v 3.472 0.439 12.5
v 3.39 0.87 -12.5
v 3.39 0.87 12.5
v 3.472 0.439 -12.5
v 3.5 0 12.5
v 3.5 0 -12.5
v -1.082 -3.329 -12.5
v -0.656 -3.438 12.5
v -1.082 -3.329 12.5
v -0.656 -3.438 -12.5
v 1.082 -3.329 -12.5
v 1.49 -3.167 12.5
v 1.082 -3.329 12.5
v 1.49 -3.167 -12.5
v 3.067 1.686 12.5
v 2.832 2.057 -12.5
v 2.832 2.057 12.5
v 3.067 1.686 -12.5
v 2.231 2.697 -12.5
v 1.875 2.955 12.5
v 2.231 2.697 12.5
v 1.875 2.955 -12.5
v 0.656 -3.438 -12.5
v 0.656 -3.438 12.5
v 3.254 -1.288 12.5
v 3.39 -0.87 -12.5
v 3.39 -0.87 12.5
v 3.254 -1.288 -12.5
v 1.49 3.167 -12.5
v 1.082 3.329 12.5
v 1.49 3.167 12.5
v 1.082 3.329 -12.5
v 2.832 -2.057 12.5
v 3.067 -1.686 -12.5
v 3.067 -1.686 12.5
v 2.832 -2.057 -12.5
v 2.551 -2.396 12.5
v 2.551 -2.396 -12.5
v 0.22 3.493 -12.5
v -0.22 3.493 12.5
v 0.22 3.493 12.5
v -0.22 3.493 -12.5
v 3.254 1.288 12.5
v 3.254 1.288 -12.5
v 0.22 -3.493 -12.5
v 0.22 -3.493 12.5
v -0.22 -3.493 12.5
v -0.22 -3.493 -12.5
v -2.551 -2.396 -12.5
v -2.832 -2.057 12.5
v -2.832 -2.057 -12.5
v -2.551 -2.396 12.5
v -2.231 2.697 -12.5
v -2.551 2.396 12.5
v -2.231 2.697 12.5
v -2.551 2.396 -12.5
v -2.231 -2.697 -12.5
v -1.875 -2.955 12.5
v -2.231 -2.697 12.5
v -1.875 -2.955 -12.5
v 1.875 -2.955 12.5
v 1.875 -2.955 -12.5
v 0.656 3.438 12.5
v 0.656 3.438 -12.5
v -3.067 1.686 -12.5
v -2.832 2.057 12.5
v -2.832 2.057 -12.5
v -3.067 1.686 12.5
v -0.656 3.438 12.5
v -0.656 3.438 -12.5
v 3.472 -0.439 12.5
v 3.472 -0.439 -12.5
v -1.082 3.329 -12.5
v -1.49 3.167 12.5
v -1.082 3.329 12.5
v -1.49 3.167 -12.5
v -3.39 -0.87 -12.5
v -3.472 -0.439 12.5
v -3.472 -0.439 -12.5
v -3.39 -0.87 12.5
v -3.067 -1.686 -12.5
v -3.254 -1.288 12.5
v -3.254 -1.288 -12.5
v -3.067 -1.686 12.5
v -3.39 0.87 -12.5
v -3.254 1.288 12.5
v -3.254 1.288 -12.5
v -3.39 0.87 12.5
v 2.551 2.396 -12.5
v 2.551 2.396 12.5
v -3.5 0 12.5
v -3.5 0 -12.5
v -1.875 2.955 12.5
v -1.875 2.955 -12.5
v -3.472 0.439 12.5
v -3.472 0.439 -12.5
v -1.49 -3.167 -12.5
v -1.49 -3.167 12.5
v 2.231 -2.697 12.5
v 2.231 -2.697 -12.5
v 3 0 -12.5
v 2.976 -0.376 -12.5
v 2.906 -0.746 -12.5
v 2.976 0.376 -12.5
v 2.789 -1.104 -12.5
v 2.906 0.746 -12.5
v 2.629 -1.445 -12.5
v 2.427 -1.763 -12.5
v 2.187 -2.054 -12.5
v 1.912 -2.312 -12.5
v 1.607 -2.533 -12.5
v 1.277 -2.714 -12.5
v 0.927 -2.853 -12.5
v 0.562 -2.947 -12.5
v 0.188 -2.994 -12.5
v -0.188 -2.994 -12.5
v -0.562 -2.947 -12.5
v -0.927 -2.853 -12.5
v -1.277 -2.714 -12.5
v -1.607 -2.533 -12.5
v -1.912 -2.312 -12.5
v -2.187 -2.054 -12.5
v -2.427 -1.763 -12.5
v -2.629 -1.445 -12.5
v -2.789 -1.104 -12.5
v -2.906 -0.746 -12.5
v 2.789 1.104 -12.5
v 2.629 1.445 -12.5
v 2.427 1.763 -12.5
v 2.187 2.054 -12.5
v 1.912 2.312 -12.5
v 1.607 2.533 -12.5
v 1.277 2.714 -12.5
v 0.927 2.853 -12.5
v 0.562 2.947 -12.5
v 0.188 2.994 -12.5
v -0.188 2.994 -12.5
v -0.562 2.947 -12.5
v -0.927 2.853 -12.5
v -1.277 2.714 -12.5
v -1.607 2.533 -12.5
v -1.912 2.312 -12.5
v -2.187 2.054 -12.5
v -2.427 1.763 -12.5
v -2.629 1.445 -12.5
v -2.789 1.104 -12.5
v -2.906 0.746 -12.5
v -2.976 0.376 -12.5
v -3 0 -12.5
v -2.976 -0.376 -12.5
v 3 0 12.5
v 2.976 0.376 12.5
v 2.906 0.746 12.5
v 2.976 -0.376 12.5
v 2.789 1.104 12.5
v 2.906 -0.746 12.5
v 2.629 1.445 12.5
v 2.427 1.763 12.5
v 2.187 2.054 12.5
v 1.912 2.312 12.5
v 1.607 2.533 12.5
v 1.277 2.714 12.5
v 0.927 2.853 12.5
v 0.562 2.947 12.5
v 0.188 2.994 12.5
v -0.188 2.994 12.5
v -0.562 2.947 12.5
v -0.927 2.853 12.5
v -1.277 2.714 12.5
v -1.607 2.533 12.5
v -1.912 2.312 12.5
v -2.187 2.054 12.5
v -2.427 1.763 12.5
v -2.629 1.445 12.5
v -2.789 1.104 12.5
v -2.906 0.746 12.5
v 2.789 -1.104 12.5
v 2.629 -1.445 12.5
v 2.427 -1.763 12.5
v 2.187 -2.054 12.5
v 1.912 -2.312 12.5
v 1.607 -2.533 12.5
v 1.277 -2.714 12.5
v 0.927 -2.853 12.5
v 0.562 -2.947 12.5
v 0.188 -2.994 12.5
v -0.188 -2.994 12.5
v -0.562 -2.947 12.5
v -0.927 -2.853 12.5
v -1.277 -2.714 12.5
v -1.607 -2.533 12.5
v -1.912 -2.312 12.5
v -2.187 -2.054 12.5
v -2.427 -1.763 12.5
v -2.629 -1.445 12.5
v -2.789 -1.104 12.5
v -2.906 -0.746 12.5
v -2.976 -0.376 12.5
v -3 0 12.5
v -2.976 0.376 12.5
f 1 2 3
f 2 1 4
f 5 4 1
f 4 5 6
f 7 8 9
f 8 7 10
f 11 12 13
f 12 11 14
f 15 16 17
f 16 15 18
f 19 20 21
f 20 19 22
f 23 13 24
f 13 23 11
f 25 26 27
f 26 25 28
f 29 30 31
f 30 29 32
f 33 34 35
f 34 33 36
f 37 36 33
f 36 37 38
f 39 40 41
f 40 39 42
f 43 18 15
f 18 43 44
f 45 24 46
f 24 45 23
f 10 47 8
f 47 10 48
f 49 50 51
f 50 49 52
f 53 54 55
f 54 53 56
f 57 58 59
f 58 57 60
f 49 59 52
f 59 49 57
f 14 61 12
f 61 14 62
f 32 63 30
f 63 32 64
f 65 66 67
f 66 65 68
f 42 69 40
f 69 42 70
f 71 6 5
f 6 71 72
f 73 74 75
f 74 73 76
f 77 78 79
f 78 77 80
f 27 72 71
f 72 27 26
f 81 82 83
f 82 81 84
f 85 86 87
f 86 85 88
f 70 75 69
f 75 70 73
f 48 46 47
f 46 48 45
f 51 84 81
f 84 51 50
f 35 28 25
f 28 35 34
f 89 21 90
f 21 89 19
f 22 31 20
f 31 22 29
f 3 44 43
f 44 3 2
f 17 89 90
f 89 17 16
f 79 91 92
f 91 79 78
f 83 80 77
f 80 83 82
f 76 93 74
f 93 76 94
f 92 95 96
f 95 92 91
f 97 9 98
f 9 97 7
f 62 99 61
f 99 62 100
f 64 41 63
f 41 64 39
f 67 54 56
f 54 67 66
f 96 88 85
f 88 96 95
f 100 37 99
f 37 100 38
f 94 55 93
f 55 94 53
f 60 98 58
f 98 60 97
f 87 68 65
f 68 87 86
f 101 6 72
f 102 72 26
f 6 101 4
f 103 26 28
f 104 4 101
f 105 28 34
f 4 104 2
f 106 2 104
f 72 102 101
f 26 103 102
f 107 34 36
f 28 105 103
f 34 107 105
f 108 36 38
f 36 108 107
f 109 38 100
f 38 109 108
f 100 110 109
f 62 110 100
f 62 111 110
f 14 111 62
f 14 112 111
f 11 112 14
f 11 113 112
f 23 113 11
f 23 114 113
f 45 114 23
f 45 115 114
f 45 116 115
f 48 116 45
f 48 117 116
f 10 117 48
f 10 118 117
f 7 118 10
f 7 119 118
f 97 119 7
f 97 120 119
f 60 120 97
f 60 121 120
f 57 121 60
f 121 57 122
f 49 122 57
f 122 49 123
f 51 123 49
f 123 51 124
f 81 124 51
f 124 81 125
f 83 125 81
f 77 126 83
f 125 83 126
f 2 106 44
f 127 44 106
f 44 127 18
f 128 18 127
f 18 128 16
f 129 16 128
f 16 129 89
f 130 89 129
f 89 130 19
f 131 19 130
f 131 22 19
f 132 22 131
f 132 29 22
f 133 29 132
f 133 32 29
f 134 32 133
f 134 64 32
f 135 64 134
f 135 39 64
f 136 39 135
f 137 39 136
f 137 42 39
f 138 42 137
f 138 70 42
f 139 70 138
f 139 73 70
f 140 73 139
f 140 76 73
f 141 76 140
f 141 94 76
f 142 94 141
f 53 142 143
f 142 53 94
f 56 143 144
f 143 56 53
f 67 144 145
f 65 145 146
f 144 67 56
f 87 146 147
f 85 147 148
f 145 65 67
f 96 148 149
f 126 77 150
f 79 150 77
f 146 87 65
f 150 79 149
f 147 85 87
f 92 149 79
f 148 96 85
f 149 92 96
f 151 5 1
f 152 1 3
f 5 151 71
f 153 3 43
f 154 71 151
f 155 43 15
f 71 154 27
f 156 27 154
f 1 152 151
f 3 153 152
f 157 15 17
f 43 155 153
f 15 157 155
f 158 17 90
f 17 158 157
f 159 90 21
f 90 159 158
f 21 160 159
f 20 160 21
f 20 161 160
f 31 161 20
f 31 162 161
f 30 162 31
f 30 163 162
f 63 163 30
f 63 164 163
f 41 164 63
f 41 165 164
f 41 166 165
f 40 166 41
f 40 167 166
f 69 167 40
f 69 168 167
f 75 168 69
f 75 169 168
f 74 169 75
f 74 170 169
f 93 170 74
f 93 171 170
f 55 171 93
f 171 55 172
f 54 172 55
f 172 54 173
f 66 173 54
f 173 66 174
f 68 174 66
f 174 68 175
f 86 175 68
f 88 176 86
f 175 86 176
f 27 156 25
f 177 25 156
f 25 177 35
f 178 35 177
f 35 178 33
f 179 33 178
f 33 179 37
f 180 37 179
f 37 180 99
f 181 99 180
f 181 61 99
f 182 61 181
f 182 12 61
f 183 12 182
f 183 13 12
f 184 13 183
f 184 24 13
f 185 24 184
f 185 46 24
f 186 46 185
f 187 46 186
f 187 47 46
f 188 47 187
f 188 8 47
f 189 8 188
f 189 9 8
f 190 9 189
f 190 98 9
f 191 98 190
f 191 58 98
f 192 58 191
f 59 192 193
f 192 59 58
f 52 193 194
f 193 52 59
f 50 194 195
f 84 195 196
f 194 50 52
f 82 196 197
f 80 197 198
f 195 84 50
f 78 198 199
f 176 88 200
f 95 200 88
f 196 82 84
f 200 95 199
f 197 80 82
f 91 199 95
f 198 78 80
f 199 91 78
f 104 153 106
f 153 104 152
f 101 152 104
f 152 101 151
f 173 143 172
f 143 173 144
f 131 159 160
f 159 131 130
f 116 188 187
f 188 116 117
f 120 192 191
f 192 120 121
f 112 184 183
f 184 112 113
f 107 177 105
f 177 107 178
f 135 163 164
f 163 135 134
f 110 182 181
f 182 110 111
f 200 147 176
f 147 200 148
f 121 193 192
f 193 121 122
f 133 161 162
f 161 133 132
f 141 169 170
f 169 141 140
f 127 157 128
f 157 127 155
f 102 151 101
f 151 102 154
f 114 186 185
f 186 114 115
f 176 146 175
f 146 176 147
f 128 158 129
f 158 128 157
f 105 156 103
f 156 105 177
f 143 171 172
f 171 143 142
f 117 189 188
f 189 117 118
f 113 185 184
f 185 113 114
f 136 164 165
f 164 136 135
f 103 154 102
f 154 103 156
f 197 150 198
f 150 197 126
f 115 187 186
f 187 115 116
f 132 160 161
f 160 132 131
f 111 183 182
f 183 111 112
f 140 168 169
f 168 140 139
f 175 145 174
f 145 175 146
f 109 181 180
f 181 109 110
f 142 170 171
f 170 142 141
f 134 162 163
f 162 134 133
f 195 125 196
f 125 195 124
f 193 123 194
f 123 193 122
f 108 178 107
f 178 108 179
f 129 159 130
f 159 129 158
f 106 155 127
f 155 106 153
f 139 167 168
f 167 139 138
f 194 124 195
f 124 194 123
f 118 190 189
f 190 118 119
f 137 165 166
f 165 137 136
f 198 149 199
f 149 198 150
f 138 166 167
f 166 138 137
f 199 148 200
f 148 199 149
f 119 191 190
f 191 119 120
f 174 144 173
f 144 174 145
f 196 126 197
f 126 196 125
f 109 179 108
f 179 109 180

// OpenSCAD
$fn = 50;


difference() {
	union() {
		translate(v = [0, 0, -12.5000000000]) {
			cylinder(h = 25, r = 3.5000000000);
		}
	}
	union() {
		translate(v = [0, 0, -100.0000000000]) {
			cylinder(h = 200, r = 3.0000000000);
		}
	}
}
